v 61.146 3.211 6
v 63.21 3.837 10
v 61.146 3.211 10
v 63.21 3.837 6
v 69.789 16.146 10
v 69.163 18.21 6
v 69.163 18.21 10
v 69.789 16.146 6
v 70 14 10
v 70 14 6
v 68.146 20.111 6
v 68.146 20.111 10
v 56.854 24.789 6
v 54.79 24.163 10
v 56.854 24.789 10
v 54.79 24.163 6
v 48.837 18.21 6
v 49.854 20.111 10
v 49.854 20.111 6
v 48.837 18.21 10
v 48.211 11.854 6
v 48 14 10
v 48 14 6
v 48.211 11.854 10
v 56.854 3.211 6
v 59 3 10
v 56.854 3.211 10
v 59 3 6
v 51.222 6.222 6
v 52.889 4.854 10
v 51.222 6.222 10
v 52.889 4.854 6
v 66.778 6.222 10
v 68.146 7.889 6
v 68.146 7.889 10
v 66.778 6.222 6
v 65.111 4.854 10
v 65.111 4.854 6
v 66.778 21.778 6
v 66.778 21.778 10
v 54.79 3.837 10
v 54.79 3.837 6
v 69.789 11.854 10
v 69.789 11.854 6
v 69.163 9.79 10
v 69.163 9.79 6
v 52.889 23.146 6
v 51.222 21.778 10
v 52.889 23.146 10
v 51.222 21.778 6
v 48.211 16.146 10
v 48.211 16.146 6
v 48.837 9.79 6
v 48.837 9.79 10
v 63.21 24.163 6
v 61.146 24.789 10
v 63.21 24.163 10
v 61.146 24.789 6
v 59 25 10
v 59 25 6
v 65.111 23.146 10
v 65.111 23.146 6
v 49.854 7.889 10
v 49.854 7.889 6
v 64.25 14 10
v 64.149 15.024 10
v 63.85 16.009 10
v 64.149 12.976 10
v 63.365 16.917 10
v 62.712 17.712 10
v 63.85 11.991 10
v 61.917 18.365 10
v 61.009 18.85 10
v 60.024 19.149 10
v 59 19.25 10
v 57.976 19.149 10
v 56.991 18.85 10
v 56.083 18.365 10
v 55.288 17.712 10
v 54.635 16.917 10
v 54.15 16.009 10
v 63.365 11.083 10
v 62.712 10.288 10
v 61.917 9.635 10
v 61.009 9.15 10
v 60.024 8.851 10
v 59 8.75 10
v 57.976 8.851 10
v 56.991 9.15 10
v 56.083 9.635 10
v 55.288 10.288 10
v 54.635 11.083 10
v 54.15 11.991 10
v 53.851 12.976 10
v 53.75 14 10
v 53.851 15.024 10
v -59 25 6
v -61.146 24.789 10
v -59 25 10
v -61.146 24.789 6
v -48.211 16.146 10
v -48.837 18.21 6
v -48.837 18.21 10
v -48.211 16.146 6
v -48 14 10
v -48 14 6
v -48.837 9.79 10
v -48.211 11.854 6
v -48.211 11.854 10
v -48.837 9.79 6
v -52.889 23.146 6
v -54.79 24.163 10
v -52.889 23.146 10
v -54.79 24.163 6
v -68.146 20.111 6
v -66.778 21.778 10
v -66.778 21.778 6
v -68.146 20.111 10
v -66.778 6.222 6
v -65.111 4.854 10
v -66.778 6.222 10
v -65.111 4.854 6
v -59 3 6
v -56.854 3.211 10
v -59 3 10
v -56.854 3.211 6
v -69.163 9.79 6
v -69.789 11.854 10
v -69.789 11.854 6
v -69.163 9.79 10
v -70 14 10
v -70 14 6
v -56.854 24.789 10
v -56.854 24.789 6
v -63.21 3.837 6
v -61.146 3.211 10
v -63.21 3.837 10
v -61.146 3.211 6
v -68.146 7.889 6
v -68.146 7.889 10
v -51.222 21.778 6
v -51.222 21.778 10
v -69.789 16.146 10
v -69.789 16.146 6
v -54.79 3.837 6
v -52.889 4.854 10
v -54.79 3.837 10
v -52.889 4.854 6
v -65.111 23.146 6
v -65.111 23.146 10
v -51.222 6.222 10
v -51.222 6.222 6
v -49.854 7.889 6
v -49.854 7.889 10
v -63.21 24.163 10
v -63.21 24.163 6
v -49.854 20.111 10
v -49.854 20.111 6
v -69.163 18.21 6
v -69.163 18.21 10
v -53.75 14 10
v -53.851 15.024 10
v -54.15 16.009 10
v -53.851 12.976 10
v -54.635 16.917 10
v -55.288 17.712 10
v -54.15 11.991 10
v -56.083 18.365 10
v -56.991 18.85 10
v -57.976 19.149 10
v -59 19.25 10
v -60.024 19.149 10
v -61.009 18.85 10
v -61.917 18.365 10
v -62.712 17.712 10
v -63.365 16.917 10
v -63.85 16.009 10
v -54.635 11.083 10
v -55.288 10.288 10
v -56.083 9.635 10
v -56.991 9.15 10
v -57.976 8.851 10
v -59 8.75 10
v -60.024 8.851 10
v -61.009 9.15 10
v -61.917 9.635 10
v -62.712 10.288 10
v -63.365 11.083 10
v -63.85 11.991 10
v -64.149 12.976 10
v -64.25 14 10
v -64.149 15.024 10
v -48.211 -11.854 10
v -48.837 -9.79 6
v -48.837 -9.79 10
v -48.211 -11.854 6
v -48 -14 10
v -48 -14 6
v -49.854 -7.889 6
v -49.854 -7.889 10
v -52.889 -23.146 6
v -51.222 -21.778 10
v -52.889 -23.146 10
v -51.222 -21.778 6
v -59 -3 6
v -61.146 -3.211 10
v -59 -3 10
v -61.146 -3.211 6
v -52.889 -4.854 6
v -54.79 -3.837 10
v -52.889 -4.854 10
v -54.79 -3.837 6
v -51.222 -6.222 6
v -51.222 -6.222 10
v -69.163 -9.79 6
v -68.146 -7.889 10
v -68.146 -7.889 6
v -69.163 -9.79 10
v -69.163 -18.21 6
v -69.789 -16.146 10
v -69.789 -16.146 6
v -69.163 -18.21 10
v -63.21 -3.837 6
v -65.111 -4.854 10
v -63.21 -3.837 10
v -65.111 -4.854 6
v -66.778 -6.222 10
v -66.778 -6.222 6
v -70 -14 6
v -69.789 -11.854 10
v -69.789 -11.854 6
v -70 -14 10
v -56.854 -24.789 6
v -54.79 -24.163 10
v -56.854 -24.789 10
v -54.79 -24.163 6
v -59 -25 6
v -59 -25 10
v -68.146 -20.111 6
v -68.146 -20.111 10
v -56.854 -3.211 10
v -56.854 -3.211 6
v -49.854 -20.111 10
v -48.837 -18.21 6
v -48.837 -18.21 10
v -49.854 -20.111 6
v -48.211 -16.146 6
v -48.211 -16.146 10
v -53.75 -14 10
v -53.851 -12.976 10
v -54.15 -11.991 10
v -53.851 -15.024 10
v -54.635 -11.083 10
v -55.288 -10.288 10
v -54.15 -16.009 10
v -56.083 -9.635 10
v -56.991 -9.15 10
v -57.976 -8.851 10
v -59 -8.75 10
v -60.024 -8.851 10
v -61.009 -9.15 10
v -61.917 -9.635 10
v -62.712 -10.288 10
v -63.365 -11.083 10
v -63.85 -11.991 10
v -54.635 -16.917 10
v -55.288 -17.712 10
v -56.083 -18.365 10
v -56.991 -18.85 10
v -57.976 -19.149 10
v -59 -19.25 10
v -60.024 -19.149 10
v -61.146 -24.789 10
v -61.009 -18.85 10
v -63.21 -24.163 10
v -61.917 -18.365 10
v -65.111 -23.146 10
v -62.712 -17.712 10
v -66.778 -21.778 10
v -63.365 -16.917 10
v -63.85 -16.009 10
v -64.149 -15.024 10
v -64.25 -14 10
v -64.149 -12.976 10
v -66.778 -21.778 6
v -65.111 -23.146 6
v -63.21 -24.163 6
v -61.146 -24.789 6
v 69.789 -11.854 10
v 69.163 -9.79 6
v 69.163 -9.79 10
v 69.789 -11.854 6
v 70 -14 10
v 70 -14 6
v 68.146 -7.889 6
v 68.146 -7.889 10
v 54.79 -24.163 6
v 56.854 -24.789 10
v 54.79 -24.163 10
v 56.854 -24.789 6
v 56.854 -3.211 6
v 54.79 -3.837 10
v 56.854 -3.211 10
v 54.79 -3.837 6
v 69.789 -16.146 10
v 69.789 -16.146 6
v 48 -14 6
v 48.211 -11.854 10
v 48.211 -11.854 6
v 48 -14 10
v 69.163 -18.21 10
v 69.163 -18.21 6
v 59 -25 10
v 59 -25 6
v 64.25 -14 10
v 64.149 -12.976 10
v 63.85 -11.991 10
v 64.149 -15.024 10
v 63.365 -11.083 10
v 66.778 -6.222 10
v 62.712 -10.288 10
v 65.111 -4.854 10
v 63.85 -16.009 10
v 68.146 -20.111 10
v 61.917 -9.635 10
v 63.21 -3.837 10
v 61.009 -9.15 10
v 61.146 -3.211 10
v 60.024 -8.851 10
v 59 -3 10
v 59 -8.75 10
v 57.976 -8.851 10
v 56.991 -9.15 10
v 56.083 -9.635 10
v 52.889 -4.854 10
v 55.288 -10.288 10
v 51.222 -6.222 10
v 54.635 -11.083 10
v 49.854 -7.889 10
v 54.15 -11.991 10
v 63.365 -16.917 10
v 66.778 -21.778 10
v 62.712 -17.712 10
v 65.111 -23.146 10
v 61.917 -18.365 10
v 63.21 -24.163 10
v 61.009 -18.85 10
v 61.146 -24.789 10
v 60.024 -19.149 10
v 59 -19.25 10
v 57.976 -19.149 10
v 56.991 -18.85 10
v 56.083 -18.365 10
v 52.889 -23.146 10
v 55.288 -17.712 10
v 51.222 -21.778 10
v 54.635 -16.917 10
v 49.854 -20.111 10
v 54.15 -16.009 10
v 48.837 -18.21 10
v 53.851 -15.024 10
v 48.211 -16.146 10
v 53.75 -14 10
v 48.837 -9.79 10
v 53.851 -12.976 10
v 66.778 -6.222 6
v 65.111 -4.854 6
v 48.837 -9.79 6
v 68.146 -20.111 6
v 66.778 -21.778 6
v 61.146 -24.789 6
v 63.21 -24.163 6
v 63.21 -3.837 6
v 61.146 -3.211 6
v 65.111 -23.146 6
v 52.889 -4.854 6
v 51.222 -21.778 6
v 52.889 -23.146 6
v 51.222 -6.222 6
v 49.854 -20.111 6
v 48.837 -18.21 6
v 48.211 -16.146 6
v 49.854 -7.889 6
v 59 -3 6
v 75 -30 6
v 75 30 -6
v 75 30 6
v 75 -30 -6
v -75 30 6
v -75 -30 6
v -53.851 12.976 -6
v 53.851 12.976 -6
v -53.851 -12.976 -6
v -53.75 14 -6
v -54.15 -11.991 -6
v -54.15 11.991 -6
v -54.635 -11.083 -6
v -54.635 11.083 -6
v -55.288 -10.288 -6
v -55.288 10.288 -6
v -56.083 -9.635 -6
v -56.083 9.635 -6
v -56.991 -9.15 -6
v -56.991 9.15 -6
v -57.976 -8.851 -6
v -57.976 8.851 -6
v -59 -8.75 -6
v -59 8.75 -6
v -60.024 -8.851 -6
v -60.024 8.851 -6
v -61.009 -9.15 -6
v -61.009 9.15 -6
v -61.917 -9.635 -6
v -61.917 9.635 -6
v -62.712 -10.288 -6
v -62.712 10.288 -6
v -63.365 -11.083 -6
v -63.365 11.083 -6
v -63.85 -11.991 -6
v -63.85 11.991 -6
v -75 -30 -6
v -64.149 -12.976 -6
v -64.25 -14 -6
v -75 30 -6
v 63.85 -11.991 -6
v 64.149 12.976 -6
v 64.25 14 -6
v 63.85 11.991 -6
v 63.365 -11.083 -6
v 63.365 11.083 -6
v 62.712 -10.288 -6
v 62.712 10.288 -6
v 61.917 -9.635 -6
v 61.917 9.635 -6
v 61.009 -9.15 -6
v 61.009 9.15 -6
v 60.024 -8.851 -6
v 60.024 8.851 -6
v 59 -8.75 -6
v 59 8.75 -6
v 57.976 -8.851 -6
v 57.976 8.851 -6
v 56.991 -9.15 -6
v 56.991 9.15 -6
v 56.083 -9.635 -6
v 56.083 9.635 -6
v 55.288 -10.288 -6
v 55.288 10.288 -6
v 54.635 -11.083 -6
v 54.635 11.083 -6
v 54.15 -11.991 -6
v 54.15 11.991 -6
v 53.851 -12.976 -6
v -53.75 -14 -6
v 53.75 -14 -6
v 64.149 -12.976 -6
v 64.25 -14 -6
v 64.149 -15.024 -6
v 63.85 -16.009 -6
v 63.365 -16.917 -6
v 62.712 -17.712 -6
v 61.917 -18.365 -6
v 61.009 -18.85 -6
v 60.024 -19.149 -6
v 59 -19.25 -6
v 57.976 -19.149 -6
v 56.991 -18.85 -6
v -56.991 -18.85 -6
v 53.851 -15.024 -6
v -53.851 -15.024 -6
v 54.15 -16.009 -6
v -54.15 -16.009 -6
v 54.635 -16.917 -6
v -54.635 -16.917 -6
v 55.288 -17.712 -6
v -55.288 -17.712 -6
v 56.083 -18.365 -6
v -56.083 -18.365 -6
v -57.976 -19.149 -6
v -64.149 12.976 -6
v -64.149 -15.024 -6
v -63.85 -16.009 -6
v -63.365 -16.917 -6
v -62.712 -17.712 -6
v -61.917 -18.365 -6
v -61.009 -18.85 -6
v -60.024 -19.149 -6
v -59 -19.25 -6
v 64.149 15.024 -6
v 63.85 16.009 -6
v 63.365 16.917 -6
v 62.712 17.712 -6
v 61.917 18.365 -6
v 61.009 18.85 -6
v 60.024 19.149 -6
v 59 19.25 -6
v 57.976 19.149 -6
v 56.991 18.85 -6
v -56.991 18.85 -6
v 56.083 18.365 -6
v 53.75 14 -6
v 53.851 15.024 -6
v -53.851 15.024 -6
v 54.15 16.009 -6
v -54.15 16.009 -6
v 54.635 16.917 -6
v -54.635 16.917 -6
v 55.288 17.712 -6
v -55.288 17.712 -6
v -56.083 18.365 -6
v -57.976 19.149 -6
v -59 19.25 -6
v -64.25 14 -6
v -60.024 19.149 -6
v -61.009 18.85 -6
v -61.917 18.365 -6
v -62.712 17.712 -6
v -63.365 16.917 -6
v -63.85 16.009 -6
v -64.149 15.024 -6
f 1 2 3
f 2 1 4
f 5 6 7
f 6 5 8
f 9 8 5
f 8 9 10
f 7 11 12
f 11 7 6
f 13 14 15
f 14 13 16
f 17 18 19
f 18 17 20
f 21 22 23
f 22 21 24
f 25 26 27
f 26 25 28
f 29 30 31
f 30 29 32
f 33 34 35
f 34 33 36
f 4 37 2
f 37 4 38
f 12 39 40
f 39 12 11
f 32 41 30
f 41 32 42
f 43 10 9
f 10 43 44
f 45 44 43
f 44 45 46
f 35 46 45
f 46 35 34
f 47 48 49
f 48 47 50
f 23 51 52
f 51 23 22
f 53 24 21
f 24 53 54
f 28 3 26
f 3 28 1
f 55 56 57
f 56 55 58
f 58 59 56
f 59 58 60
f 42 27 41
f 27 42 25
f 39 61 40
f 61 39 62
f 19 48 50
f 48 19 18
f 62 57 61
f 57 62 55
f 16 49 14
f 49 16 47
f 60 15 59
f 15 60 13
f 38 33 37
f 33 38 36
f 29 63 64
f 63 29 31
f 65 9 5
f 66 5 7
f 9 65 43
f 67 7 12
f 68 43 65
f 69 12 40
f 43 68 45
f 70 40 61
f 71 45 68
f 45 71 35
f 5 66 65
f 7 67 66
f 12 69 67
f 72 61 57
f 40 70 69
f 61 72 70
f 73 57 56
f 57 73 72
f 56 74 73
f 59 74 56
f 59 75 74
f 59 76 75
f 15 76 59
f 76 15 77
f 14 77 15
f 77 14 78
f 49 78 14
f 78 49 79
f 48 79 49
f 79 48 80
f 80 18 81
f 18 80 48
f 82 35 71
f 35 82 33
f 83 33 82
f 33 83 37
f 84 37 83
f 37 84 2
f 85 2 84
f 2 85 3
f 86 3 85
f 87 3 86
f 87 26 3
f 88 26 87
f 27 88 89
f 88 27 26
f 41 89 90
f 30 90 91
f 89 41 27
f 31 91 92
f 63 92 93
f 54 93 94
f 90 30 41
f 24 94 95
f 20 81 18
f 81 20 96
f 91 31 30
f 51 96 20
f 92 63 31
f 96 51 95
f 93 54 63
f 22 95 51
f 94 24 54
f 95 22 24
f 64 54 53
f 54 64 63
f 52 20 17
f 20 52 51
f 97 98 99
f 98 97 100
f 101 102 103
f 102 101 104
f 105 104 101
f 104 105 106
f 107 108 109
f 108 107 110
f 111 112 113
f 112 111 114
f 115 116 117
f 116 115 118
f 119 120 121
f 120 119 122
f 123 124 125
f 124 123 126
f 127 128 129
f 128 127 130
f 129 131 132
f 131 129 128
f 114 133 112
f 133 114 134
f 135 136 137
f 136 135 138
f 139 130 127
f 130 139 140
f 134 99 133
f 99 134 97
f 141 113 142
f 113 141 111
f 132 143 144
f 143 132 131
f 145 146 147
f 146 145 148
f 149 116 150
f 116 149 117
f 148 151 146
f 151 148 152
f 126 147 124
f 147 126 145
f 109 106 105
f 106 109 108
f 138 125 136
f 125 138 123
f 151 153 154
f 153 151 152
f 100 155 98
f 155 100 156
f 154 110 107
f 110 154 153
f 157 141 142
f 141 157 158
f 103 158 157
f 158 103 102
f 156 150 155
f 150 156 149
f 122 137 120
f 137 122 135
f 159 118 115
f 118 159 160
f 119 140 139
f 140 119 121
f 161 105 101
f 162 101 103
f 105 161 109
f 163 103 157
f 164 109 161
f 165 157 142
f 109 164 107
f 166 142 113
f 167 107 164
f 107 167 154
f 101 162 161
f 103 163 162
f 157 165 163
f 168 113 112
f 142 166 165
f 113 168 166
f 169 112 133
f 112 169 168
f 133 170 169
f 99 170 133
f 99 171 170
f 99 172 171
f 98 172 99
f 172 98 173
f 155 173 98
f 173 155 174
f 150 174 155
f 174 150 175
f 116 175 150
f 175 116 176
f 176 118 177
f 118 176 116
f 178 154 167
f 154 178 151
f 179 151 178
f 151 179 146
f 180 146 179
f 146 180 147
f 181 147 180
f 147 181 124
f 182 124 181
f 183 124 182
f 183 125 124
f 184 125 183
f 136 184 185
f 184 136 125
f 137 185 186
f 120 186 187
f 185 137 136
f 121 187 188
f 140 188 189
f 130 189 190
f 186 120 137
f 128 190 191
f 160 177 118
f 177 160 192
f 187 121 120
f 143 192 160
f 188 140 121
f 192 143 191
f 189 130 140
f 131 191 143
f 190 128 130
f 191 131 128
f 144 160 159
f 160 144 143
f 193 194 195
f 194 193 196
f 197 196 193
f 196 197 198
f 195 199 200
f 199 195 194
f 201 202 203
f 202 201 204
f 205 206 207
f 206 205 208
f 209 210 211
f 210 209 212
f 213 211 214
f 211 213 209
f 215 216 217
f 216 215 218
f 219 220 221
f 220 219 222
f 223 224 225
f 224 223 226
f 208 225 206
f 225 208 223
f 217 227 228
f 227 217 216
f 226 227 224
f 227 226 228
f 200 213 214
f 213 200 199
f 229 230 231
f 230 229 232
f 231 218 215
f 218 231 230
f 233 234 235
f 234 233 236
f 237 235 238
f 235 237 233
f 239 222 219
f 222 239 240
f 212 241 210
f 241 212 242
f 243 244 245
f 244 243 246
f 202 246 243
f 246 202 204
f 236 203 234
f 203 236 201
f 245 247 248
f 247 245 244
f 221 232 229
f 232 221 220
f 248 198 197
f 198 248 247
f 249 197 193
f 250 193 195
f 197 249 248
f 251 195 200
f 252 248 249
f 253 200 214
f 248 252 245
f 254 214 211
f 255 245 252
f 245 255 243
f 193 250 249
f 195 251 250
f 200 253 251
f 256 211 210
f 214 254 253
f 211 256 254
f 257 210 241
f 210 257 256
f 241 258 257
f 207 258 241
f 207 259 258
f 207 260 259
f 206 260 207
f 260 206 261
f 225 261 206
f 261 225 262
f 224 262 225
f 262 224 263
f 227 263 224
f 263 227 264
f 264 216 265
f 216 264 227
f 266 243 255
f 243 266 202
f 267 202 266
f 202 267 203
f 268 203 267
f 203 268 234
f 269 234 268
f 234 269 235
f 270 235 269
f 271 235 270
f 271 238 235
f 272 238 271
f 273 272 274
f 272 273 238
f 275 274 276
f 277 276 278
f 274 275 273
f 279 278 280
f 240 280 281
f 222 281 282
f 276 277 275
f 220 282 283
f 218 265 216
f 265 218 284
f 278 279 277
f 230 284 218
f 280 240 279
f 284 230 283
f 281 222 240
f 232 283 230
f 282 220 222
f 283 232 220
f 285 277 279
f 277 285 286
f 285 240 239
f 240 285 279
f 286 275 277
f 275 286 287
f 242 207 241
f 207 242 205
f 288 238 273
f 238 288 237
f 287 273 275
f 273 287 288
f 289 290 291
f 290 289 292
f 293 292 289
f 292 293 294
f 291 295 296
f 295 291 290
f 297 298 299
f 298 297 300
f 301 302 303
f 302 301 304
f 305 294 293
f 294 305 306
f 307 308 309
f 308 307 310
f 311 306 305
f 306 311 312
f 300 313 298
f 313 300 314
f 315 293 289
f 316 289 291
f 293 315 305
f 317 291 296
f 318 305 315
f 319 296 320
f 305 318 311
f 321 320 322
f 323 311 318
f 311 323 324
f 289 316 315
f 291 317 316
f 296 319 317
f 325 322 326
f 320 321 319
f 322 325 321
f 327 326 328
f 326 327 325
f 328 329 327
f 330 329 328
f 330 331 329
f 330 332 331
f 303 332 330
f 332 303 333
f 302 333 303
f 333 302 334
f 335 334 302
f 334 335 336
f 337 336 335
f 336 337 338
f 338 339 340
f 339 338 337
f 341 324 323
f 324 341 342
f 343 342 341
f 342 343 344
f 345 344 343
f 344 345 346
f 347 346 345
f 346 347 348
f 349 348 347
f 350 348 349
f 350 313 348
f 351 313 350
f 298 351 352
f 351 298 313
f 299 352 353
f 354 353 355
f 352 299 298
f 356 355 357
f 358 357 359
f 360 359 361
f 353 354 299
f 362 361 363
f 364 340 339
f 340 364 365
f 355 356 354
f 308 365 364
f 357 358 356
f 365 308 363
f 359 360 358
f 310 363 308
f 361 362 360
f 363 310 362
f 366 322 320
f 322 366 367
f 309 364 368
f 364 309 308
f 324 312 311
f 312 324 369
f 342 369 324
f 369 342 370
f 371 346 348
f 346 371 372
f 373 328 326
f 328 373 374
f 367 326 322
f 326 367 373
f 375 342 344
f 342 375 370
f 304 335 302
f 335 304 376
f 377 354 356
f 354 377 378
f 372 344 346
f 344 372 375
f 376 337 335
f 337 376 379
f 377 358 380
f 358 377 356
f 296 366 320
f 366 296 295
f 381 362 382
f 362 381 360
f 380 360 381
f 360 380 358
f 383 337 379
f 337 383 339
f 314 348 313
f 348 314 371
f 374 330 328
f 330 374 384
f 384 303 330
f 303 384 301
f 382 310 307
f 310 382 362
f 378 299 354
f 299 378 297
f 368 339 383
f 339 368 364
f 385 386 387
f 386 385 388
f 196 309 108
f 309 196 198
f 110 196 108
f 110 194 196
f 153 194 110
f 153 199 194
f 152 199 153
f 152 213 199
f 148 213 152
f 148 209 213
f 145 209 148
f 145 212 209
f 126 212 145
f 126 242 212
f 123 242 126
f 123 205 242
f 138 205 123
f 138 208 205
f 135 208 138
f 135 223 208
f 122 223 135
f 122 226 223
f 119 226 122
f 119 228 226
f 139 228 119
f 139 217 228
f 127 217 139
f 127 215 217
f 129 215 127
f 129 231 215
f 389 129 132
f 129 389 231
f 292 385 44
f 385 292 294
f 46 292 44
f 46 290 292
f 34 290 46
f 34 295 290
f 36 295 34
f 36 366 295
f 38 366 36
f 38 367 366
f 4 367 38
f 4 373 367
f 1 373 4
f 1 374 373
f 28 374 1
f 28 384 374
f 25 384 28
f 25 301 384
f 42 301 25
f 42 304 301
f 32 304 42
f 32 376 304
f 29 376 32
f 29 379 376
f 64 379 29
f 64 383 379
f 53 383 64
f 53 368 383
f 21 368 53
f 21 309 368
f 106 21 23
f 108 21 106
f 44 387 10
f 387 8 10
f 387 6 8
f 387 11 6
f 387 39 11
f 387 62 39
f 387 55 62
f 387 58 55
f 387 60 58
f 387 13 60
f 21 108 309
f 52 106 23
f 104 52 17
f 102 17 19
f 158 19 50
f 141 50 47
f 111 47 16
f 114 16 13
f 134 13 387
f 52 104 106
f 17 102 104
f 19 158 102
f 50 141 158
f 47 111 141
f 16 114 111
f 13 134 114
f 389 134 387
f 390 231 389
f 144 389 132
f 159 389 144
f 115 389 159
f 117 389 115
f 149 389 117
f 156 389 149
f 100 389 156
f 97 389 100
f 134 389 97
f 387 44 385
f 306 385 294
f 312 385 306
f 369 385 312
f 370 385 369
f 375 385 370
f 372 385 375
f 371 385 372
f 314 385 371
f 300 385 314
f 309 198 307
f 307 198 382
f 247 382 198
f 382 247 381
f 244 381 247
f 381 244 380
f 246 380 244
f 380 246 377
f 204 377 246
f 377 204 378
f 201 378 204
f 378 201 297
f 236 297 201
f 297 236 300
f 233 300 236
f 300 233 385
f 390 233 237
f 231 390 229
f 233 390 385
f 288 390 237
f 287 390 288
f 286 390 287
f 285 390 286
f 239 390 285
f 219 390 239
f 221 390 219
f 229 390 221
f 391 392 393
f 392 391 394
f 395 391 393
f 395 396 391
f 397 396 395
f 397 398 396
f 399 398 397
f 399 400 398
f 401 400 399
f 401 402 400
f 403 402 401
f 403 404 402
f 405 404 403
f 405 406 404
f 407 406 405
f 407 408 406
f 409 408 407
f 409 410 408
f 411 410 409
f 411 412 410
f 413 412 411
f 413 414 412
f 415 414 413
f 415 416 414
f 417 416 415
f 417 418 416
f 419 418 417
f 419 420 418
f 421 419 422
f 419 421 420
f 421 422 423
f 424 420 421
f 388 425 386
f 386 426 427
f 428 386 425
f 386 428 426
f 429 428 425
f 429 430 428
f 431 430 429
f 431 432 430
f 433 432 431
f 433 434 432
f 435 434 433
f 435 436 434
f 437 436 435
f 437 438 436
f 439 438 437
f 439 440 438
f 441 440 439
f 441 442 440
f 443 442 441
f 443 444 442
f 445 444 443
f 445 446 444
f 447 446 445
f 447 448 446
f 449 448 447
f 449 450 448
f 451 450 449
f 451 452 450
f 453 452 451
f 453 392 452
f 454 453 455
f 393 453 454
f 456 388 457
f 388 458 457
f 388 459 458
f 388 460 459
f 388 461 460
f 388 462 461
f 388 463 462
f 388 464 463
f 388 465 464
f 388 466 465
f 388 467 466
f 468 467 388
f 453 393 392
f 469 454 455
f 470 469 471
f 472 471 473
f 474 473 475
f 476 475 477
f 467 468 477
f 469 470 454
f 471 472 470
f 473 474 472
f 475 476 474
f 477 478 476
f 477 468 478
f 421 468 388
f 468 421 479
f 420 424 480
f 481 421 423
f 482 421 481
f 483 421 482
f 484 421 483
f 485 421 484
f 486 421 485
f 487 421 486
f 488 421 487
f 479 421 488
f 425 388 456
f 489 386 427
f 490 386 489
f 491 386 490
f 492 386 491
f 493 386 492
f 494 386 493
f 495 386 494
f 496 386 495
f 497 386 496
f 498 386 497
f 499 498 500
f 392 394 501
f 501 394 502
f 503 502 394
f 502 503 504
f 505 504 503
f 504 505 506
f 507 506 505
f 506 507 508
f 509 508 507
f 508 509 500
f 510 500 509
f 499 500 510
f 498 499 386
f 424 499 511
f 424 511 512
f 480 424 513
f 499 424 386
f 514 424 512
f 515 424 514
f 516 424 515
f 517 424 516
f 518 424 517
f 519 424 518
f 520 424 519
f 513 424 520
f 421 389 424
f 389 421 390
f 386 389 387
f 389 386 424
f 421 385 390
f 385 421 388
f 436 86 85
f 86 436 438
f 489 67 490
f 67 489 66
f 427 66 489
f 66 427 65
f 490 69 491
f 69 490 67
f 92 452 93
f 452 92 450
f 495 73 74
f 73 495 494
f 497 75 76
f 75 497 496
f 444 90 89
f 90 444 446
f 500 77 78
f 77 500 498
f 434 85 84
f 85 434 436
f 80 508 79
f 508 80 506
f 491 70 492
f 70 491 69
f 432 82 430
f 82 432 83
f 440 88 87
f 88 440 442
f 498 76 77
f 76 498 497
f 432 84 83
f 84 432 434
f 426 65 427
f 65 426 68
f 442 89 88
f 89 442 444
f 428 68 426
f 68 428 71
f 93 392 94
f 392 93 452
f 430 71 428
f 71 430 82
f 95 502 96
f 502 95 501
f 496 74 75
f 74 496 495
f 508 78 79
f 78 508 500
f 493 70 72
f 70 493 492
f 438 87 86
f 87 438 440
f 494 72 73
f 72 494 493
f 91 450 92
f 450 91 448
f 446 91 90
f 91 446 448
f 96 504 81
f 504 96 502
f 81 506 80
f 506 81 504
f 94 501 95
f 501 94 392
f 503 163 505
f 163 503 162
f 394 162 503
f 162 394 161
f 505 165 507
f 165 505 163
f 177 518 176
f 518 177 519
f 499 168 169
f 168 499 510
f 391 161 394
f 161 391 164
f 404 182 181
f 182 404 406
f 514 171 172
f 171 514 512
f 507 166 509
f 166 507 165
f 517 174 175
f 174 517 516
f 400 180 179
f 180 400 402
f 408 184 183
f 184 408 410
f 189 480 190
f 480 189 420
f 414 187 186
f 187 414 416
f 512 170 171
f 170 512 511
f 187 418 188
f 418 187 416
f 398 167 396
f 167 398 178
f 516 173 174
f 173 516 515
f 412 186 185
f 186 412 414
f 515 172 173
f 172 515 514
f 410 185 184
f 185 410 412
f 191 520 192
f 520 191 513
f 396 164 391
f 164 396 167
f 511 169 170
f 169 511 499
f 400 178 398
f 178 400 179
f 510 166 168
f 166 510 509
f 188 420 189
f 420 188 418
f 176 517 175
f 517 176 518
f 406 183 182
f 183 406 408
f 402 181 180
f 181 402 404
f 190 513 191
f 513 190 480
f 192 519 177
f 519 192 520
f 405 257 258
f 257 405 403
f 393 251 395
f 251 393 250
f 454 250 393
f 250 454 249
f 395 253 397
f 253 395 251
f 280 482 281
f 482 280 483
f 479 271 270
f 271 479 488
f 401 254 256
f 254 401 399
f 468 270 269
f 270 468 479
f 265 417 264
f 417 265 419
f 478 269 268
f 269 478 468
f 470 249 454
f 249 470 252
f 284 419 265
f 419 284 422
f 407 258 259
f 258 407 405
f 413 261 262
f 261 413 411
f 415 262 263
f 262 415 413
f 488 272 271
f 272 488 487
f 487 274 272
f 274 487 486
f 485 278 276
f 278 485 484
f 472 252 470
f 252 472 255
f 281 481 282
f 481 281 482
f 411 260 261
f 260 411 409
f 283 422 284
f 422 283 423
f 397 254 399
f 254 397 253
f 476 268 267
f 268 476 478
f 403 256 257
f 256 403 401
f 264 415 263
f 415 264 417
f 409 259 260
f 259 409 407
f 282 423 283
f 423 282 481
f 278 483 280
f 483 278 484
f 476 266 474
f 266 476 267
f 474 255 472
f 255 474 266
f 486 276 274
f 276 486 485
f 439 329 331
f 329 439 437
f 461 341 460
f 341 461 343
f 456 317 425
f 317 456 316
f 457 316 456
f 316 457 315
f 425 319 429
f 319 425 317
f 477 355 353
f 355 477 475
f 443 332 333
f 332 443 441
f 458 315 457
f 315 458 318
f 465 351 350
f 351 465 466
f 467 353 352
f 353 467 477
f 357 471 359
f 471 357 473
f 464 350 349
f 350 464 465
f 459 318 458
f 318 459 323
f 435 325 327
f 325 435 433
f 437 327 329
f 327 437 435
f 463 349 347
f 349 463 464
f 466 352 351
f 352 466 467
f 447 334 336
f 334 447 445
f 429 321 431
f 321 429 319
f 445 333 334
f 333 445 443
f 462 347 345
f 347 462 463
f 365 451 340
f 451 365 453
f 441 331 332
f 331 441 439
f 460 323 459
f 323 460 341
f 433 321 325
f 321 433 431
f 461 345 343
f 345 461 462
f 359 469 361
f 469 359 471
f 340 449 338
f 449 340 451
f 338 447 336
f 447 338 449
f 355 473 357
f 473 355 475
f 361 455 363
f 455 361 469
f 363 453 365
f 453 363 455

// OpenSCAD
$fn = 32;

// ----------------------------------------------------------------------
// Anchor pads 150 x 60 x 16
// four corner bosses with anchor holes
// ----------------------------------------------------------------------

// --- parameters (mm) ---
plate = [150, 60, 12];  // base plate size (x, y, z)
pads = 4;               // boss count, one per corner
edge = 16;              // boss centre offset from the plate edge
boss_d = 22;            // boss diameter
boss_h = 4;             // boss height above the base plate
hole_d = 10.5;          // hole diameter

// --- derived feature positions (mm) ---
height = plate[2] + boss_h;      // = 16   overall height of the part
corner_x = plate[0] / 2 - edge;  // = 59   boss centre X
corner_y = plate[1] / 2 - edge;  // = 14   boss centre Y
feature_centers = [
  [corner_x, corner_y],
  [-corner_x, corner_y],
  [-corner_x, -corner_y],
  [corner_x, -corner_y]
];   // boss centres, anchor holes are drilled there

// base plate, four bosses standing on it, anchor holes all the way through
difference() {
  union() {
    cube(plate, center = true);
    for (centre = feature_centers)
      translate([centre[0], centre[1], plate[2] / 2 - 1])
        cylinder(d = boss_d, h = boss_h + 1);
  }
  for (centre = feature_centers)
    translate([centre[0], centre[1], -height])
      cylinder(d = hole_d, h = 2 * height + 2);  // through boss and plate
}
